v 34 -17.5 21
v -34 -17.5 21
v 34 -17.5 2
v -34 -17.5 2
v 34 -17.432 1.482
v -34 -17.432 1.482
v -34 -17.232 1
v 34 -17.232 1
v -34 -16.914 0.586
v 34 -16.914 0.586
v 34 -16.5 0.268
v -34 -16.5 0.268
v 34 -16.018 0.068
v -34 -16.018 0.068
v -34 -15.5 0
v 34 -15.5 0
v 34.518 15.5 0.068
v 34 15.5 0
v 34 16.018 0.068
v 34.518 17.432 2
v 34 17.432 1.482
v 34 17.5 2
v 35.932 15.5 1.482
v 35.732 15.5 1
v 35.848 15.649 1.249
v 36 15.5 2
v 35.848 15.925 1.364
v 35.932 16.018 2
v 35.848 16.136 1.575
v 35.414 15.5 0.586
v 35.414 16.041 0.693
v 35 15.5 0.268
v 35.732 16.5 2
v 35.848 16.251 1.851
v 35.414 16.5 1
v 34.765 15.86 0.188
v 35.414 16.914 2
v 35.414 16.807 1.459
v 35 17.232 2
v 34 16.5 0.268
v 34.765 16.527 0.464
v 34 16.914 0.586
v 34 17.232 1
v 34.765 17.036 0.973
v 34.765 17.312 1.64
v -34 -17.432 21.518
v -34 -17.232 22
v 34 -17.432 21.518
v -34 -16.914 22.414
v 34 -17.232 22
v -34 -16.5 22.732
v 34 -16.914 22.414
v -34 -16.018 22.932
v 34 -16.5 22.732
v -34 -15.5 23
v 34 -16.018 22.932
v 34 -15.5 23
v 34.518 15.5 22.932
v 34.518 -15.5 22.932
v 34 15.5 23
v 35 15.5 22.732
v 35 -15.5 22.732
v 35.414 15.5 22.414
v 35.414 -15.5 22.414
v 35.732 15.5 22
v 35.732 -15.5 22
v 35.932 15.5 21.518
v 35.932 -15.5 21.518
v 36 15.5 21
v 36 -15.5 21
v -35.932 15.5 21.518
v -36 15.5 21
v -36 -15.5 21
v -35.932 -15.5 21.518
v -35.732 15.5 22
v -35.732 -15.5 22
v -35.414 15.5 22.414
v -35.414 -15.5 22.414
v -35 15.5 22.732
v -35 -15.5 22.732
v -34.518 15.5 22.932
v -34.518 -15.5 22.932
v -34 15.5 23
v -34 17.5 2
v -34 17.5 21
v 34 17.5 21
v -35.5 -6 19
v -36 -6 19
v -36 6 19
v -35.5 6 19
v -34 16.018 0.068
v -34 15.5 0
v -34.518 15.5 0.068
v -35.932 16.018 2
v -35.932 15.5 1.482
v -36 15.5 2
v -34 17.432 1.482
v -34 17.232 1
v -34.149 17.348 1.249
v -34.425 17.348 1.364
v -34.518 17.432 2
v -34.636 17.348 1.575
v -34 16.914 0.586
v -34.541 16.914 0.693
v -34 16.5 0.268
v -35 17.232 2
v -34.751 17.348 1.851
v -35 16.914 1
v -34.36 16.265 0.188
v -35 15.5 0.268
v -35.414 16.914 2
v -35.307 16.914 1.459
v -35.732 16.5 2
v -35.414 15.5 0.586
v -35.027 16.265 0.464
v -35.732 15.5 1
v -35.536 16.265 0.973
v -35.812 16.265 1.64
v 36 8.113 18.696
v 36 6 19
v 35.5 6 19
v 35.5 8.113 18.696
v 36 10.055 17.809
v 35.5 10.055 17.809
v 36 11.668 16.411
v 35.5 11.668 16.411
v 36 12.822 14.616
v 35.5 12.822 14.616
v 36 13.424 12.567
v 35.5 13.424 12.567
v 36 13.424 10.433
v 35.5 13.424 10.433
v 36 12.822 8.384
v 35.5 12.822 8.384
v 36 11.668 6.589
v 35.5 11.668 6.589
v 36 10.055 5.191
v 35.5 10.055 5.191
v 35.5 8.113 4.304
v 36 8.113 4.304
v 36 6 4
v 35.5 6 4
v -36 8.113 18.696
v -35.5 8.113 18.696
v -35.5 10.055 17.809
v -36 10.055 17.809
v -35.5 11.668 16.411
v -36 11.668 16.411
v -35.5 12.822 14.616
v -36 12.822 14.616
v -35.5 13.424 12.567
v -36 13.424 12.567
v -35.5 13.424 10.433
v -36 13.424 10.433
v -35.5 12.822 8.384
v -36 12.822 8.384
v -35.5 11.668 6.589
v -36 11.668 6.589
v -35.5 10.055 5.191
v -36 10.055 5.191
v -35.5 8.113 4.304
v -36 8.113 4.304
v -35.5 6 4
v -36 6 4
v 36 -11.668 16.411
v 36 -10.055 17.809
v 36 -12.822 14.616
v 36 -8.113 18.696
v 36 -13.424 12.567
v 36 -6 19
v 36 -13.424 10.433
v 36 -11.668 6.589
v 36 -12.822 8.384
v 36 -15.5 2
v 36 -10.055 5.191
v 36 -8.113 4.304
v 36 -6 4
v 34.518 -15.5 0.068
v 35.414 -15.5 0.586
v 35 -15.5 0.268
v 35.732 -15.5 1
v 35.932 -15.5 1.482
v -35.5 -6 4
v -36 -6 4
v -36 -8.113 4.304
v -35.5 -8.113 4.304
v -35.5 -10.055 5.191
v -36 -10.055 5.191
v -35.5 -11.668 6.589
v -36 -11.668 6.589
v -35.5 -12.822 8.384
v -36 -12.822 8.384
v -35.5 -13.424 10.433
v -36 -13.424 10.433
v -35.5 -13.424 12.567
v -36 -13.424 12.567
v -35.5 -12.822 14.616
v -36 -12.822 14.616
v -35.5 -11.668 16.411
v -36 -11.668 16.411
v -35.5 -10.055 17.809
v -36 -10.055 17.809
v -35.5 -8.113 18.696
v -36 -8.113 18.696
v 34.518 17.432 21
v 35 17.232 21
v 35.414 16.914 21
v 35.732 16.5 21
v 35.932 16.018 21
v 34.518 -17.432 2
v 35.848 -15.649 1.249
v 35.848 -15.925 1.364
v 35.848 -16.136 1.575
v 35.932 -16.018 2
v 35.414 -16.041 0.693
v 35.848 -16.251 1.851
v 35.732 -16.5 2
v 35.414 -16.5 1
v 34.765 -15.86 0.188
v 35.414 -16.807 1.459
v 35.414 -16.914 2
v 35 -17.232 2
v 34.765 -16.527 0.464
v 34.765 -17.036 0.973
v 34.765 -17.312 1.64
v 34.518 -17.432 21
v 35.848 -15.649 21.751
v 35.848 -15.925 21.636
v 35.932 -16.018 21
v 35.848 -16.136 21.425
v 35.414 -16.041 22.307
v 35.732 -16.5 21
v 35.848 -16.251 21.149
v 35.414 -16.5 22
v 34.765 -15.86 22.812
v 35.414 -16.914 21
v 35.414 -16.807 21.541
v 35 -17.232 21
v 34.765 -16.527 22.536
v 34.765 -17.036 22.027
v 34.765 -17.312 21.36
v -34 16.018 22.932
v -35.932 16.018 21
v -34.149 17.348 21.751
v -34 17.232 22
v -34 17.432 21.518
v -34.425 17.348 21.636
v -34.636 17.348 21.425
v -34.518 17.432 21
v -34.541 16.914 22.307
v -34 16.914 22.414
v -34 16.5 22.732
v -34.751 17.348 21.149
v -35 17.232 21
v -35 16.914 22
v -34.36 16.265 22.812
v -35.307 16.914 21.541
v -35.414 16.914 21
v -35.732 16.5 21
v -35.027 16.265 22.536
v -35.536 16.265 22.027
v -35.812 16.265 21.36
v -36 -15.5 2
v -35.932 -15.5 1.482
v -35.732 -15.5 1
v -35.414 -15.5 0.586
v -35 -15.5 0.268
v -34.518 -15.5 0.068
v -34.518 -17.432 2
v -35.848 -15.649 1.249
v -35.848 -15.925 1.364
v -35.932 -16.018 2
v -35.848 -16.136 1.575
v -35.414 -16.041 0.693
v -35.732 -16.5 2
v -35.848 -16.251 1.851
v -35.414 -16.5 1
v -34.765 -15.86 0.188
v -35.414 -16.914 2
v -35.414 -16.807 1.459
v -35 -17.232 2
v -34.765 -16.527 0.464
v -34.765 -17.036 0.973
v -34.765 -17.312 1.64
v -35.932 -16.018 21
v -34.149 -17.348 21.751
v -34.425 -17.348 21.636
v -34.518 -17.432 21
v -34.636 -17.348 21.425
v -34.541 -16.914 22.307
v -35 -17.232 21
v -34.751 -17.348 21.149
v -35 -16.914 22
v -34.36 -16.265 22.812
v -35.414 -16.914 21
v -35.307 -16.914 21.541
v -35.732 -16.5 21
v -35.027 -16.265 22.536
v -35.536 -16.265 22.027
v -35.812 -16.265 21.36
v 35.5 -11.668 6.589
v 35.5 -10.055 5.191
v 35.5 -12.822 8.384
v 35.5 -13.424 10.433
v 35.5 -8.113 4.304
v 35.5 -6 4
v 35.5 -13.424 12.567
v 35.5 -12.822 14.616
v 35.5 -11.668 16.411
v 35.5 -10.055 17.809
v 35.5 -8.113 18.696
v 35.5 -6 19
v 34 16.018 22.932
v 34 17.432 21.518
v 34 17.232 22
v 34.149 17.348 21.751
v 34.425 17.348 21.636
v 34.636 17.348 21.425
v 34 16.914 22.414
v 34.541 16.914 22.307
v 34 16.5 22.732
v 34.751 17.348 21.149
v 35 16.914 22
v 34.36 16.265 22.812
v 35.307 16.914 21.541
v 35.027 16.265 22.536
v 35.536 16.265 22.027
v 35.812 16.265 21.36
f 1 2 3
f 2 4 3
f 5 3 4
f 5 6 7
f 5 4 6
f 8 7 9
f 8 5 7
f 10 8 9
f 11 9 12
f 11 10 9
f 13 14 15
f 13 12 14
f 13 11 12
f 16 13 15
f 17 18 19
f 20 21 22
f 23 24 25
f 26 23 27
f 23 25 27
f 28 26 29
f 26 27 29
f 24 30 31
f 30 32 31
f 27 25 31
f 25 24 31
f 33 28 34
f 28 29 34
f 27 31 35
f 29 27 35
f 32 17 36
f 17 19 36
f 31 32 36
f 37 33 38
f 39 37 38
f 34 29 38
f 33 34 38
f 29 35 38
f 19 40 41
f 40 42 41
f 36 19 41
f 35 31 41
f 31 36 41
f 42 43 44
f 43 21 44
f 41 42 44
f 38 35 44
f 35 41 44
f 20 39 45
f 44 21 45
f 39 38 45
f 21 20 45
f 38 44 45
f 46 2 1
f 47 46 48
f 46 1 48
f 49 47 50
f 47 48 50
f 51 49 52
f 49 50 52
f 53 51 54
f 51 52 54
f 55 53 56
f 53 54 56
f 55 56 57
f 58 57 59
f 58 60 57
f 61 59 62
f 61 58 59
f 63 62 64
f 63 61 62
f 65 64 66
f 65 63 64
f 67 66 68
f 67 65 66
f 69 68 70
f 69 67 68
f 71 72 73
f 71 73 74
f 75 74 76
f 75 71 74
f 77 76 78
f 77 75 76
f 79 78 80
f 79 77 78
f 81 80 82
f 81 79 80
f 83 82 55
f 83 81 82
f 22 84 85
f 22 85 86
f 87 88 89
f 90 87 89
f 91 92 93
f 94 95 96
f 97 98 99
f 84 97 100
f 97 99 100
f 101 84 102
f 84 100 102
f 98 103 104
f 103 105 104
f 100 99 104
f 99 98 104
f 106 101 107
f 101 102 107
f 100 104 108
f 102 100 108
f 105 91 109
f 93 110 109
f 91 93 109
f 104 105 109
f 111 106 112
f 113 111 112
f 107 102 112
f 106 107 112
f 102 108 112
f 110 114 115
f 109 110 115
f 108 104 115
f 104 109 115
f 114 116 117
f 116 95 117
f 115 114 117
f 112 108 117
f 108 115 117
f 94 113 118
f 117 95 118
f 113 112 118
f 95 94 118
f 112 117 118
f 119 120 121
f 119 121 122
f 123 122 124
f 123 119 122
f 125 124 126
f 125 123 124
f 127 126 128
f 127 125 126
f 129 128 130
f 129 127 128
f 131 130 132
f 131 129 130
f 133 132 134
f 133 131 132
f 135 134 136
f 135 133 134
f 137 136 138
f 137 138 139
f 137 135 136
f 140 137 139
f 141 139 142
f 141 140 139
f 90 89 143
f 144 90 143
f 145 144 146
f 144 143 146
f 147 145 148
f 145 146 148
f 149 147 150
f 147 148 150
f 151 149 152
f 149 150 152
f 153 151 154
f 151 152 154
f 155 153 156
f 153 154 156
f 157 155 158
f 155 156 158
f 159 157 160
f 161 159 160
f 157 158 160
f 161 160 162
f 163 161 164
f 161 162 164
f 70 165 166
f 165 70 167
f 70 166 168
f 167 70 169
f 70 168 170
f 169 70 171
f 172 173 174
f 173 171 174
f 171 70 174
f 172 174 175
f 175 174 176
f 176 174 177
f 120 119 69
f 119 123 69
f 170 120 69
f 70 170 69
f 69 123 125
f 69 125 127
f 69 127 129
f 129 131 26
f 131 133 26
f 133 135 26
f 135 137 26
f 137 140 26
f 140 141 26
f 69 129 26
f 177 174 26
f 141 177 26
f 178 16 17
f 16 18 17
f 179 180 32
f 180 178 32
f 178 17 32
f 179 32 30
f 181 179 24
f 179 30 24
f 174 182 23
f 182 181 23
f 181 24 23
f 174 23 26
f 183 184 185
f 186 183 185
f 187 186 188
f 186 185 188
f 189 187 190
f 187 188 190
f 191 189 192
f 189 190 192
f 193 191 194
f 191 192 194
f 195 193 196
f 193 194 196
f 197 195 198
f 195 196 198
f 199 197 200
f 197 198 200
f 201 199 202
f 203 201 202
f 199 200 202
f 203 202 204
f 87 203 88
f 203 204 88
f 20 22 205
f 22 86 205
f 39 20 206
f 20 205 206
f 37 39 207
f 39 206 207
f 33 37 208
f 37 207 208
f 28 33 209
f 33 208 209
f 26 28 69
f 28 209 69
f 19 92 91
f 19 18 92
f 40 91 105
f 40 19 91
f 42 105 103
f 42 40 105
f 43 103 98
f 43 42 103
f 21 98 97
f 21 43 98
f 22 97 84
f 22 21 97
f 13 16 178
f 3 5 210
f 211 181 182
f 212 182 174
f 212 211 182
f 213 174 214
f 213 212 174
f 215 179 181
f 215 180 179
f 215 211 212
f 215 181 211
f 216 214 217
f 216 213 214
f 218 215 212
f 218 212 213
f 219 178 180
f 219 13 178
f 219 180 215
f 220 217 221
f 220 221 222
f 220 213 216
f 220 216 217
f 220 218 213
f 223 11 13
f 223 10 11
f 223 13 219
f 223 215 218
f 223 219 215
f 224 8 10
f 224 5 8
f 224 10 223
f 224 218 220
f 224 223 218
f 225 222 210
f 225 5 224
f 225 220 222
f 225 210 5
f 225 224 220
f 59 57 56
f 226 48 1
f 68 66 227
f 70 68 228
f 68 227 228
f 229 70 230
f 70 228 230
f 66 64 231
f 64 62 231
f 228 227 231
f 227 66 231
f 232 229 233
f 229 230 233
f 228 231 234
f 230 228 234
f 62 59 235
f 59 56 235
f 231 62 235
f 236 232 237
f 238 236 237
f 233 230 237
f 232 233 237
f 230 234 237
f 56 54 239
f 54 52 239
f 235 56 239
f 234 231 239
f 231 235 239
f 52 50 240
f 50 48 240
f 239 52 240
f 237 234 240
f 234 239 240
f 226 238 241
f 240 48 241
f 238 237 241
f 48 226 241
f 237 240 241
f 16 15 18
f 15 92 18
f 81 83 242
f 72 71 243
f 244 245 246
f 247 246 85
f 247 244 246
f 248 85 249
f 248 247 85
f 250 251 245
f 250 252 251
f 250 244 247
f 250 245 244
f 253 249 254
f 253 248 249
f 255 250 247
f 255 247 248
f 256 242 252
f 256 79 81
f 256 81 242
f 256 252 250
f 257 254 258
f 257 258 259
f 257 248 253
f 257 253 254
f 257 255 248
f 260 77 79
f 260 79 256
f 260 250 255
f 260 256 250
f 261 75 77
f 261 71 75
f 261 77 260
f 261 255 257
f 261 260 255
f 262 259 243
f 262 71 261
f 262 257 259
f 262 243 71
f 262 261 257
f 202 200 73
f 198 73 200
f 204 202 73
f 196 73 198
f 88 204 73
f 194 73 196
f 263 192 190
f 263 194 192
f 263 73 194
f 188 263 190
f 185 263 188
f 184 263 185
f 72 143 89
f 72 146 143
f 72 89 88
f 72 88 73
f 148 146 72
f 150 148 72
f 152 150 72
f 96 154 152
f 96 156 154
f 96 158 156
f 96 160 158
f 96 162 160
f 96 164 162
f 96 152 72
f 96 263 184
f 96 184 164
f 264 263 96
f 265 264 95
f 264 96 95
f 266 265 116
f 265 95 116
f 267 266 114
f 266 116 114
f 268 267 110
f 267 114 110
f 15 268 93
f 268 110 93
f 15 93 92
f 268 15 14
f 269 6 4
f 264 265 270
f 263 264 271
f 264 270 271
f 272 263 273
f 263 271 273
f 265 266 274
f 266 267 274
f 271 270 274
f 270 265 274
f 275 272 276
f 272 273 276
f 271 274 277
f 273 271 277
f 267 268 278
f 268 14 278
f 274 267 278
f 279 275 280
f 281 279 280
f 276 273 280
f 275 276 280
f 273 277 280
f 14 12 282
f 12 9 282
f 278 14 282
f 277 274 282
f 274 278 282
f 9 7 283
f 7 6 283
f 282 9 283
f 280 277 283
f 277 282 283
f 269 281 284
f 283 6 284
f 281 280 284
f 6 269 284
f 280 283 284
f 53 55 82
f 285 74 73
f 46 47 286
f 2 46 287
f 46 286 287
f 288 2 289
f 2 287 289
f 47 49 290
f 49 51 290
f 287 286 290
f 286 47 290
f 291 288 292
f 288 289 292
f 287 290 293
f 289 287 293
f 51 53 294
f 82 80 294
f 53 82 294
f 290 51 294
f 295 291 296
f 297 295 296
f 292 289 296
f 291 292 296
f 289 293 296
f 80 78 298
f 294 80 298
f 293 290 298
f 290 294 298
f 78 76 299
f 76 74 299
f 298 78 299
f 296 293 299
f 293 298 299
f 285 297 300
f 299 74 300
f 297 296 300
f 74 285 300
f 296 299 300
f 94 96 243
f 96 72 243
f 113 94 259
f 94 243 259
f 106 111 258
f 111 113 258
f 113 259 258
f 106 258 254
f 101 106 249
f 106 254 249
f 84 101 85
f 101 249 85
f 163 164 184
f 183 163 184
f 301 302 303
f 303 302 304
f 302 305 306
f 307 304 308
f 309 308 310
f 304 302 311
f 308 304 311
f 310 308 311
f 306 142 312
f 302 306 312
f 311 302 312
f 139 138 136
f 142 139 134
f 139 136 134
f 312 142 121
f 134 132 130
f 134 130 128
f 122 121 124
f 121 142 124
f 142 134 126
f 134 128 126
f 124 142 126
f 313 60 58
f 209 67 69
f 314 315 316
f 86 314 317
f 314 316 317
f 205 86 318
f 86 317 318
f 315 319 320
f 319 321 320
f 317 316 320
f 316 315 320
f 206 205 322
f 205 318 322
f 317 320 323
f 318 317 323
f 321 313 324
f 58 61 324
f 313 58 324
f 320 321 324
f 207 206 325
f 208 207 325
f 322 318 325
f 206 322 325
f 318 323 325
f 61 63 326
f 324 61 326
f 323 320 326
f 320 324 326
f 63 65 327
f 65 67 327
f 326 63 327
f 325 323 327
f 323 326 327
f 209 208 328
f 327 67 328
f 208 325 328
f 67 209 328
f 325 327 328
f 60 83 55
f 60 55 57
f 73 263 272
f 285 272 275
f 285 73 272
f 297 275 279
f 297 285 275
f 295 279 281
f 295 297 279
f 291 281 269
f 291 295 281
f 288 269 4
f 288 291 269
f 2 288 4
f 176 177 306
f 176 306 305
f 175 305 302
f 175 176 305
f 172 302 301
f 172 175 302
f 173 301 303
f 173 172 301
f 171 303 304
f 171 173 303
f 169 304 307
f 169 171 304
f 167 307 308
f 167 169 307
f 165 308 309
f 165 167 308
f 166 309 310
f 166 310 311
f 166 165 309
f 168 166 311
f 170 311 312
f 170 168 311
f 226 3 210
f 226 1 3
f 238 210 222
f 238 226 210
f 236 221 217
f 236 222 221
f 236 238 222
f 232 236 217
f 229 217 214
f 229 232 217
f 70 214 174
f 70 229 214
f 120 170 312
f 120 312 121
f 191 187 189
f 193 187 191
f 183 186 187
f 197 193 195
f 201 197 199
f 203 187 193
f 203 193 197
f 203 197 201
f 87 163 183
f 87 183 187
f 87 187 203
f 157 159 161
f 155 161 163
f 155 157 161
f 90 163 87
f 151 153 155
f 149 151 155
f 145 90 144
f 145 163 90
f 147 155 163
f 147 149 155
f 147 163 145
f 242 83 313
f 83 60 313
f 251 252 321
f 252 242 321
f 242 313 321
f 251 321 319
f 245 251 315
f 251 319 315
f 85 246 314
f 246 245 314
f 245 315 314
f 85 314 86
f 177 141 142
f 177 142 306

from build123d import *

# Parameters (mm, degrees)
ESBO_O1_W                = 72
ESBO_O1_H                = 35
RESSALTO_EXTRUS_O1_DEPTH = 23
CORTE_EXTRUS_O1_DEPTH    = 0.5
FILETE1_R                = 2


with BuildPart() as part:
    # Esboço1 → Ressalto-extrusão1 (new body)
    with BuildSketch(Plane.XY):
        Rectangle(ESBO_O1_W, ESBO_O1_H)
    extrude(amount=RESSALTO_EXTRUS_O1_DEPTH)

    # Esboço2 → Corte-extrusão1 (cut)
    with BuildSketch(Plane(origin=(36, 0, 0), x_dir=(0, 0, -1), z_dir=(1, 0, 0))):
        with BuildLine():
            Line((-4, 6), (-4, -6))
            ThreePointArc((-4, -6), (-11.5, -13.5), (-19, -6))
            Line((-19, -6), (-19, 6))
            ThreePointArc((-19, 6), (-11.5, 13.5), (-4, 6))
        make_face()
    corte_extrus_o1 = extrude(amount=-CORTE_EXTRUS_O1_DEPTH, mode=Mode.SUBTRACT)

    # Espelhar1: Corte-extrusão1 across plane
    add(corte_extrus_o1.mirror(Plane(origin=(0, 0, 0), x_dir=(0, 0, 1), z_dir=(1, 0, 0))), mode=Mode.SUBTRACT)

    # Filete1
    filete1_edges = [part.edges().sort_by_distance(p)[0] for p in [
        (-36, 0, 23),
        (0, -17.5, 23),
        (36, 0, 23),
        (0, -17.5, 0),
        (-36, 0, 0),
        (0, 17.5, 0),
        (36, 0, 0),
        (0, 17.5, 23),
        (36, -17.5, 11.5),
        (-36, -17.5, 11.5),
        (-36, 17.5, 11.5),
        (36, 17.5, 11.5),
    ]]
    fillet(filete1_edges, radius=FILETE1_R)


solid = part.part
